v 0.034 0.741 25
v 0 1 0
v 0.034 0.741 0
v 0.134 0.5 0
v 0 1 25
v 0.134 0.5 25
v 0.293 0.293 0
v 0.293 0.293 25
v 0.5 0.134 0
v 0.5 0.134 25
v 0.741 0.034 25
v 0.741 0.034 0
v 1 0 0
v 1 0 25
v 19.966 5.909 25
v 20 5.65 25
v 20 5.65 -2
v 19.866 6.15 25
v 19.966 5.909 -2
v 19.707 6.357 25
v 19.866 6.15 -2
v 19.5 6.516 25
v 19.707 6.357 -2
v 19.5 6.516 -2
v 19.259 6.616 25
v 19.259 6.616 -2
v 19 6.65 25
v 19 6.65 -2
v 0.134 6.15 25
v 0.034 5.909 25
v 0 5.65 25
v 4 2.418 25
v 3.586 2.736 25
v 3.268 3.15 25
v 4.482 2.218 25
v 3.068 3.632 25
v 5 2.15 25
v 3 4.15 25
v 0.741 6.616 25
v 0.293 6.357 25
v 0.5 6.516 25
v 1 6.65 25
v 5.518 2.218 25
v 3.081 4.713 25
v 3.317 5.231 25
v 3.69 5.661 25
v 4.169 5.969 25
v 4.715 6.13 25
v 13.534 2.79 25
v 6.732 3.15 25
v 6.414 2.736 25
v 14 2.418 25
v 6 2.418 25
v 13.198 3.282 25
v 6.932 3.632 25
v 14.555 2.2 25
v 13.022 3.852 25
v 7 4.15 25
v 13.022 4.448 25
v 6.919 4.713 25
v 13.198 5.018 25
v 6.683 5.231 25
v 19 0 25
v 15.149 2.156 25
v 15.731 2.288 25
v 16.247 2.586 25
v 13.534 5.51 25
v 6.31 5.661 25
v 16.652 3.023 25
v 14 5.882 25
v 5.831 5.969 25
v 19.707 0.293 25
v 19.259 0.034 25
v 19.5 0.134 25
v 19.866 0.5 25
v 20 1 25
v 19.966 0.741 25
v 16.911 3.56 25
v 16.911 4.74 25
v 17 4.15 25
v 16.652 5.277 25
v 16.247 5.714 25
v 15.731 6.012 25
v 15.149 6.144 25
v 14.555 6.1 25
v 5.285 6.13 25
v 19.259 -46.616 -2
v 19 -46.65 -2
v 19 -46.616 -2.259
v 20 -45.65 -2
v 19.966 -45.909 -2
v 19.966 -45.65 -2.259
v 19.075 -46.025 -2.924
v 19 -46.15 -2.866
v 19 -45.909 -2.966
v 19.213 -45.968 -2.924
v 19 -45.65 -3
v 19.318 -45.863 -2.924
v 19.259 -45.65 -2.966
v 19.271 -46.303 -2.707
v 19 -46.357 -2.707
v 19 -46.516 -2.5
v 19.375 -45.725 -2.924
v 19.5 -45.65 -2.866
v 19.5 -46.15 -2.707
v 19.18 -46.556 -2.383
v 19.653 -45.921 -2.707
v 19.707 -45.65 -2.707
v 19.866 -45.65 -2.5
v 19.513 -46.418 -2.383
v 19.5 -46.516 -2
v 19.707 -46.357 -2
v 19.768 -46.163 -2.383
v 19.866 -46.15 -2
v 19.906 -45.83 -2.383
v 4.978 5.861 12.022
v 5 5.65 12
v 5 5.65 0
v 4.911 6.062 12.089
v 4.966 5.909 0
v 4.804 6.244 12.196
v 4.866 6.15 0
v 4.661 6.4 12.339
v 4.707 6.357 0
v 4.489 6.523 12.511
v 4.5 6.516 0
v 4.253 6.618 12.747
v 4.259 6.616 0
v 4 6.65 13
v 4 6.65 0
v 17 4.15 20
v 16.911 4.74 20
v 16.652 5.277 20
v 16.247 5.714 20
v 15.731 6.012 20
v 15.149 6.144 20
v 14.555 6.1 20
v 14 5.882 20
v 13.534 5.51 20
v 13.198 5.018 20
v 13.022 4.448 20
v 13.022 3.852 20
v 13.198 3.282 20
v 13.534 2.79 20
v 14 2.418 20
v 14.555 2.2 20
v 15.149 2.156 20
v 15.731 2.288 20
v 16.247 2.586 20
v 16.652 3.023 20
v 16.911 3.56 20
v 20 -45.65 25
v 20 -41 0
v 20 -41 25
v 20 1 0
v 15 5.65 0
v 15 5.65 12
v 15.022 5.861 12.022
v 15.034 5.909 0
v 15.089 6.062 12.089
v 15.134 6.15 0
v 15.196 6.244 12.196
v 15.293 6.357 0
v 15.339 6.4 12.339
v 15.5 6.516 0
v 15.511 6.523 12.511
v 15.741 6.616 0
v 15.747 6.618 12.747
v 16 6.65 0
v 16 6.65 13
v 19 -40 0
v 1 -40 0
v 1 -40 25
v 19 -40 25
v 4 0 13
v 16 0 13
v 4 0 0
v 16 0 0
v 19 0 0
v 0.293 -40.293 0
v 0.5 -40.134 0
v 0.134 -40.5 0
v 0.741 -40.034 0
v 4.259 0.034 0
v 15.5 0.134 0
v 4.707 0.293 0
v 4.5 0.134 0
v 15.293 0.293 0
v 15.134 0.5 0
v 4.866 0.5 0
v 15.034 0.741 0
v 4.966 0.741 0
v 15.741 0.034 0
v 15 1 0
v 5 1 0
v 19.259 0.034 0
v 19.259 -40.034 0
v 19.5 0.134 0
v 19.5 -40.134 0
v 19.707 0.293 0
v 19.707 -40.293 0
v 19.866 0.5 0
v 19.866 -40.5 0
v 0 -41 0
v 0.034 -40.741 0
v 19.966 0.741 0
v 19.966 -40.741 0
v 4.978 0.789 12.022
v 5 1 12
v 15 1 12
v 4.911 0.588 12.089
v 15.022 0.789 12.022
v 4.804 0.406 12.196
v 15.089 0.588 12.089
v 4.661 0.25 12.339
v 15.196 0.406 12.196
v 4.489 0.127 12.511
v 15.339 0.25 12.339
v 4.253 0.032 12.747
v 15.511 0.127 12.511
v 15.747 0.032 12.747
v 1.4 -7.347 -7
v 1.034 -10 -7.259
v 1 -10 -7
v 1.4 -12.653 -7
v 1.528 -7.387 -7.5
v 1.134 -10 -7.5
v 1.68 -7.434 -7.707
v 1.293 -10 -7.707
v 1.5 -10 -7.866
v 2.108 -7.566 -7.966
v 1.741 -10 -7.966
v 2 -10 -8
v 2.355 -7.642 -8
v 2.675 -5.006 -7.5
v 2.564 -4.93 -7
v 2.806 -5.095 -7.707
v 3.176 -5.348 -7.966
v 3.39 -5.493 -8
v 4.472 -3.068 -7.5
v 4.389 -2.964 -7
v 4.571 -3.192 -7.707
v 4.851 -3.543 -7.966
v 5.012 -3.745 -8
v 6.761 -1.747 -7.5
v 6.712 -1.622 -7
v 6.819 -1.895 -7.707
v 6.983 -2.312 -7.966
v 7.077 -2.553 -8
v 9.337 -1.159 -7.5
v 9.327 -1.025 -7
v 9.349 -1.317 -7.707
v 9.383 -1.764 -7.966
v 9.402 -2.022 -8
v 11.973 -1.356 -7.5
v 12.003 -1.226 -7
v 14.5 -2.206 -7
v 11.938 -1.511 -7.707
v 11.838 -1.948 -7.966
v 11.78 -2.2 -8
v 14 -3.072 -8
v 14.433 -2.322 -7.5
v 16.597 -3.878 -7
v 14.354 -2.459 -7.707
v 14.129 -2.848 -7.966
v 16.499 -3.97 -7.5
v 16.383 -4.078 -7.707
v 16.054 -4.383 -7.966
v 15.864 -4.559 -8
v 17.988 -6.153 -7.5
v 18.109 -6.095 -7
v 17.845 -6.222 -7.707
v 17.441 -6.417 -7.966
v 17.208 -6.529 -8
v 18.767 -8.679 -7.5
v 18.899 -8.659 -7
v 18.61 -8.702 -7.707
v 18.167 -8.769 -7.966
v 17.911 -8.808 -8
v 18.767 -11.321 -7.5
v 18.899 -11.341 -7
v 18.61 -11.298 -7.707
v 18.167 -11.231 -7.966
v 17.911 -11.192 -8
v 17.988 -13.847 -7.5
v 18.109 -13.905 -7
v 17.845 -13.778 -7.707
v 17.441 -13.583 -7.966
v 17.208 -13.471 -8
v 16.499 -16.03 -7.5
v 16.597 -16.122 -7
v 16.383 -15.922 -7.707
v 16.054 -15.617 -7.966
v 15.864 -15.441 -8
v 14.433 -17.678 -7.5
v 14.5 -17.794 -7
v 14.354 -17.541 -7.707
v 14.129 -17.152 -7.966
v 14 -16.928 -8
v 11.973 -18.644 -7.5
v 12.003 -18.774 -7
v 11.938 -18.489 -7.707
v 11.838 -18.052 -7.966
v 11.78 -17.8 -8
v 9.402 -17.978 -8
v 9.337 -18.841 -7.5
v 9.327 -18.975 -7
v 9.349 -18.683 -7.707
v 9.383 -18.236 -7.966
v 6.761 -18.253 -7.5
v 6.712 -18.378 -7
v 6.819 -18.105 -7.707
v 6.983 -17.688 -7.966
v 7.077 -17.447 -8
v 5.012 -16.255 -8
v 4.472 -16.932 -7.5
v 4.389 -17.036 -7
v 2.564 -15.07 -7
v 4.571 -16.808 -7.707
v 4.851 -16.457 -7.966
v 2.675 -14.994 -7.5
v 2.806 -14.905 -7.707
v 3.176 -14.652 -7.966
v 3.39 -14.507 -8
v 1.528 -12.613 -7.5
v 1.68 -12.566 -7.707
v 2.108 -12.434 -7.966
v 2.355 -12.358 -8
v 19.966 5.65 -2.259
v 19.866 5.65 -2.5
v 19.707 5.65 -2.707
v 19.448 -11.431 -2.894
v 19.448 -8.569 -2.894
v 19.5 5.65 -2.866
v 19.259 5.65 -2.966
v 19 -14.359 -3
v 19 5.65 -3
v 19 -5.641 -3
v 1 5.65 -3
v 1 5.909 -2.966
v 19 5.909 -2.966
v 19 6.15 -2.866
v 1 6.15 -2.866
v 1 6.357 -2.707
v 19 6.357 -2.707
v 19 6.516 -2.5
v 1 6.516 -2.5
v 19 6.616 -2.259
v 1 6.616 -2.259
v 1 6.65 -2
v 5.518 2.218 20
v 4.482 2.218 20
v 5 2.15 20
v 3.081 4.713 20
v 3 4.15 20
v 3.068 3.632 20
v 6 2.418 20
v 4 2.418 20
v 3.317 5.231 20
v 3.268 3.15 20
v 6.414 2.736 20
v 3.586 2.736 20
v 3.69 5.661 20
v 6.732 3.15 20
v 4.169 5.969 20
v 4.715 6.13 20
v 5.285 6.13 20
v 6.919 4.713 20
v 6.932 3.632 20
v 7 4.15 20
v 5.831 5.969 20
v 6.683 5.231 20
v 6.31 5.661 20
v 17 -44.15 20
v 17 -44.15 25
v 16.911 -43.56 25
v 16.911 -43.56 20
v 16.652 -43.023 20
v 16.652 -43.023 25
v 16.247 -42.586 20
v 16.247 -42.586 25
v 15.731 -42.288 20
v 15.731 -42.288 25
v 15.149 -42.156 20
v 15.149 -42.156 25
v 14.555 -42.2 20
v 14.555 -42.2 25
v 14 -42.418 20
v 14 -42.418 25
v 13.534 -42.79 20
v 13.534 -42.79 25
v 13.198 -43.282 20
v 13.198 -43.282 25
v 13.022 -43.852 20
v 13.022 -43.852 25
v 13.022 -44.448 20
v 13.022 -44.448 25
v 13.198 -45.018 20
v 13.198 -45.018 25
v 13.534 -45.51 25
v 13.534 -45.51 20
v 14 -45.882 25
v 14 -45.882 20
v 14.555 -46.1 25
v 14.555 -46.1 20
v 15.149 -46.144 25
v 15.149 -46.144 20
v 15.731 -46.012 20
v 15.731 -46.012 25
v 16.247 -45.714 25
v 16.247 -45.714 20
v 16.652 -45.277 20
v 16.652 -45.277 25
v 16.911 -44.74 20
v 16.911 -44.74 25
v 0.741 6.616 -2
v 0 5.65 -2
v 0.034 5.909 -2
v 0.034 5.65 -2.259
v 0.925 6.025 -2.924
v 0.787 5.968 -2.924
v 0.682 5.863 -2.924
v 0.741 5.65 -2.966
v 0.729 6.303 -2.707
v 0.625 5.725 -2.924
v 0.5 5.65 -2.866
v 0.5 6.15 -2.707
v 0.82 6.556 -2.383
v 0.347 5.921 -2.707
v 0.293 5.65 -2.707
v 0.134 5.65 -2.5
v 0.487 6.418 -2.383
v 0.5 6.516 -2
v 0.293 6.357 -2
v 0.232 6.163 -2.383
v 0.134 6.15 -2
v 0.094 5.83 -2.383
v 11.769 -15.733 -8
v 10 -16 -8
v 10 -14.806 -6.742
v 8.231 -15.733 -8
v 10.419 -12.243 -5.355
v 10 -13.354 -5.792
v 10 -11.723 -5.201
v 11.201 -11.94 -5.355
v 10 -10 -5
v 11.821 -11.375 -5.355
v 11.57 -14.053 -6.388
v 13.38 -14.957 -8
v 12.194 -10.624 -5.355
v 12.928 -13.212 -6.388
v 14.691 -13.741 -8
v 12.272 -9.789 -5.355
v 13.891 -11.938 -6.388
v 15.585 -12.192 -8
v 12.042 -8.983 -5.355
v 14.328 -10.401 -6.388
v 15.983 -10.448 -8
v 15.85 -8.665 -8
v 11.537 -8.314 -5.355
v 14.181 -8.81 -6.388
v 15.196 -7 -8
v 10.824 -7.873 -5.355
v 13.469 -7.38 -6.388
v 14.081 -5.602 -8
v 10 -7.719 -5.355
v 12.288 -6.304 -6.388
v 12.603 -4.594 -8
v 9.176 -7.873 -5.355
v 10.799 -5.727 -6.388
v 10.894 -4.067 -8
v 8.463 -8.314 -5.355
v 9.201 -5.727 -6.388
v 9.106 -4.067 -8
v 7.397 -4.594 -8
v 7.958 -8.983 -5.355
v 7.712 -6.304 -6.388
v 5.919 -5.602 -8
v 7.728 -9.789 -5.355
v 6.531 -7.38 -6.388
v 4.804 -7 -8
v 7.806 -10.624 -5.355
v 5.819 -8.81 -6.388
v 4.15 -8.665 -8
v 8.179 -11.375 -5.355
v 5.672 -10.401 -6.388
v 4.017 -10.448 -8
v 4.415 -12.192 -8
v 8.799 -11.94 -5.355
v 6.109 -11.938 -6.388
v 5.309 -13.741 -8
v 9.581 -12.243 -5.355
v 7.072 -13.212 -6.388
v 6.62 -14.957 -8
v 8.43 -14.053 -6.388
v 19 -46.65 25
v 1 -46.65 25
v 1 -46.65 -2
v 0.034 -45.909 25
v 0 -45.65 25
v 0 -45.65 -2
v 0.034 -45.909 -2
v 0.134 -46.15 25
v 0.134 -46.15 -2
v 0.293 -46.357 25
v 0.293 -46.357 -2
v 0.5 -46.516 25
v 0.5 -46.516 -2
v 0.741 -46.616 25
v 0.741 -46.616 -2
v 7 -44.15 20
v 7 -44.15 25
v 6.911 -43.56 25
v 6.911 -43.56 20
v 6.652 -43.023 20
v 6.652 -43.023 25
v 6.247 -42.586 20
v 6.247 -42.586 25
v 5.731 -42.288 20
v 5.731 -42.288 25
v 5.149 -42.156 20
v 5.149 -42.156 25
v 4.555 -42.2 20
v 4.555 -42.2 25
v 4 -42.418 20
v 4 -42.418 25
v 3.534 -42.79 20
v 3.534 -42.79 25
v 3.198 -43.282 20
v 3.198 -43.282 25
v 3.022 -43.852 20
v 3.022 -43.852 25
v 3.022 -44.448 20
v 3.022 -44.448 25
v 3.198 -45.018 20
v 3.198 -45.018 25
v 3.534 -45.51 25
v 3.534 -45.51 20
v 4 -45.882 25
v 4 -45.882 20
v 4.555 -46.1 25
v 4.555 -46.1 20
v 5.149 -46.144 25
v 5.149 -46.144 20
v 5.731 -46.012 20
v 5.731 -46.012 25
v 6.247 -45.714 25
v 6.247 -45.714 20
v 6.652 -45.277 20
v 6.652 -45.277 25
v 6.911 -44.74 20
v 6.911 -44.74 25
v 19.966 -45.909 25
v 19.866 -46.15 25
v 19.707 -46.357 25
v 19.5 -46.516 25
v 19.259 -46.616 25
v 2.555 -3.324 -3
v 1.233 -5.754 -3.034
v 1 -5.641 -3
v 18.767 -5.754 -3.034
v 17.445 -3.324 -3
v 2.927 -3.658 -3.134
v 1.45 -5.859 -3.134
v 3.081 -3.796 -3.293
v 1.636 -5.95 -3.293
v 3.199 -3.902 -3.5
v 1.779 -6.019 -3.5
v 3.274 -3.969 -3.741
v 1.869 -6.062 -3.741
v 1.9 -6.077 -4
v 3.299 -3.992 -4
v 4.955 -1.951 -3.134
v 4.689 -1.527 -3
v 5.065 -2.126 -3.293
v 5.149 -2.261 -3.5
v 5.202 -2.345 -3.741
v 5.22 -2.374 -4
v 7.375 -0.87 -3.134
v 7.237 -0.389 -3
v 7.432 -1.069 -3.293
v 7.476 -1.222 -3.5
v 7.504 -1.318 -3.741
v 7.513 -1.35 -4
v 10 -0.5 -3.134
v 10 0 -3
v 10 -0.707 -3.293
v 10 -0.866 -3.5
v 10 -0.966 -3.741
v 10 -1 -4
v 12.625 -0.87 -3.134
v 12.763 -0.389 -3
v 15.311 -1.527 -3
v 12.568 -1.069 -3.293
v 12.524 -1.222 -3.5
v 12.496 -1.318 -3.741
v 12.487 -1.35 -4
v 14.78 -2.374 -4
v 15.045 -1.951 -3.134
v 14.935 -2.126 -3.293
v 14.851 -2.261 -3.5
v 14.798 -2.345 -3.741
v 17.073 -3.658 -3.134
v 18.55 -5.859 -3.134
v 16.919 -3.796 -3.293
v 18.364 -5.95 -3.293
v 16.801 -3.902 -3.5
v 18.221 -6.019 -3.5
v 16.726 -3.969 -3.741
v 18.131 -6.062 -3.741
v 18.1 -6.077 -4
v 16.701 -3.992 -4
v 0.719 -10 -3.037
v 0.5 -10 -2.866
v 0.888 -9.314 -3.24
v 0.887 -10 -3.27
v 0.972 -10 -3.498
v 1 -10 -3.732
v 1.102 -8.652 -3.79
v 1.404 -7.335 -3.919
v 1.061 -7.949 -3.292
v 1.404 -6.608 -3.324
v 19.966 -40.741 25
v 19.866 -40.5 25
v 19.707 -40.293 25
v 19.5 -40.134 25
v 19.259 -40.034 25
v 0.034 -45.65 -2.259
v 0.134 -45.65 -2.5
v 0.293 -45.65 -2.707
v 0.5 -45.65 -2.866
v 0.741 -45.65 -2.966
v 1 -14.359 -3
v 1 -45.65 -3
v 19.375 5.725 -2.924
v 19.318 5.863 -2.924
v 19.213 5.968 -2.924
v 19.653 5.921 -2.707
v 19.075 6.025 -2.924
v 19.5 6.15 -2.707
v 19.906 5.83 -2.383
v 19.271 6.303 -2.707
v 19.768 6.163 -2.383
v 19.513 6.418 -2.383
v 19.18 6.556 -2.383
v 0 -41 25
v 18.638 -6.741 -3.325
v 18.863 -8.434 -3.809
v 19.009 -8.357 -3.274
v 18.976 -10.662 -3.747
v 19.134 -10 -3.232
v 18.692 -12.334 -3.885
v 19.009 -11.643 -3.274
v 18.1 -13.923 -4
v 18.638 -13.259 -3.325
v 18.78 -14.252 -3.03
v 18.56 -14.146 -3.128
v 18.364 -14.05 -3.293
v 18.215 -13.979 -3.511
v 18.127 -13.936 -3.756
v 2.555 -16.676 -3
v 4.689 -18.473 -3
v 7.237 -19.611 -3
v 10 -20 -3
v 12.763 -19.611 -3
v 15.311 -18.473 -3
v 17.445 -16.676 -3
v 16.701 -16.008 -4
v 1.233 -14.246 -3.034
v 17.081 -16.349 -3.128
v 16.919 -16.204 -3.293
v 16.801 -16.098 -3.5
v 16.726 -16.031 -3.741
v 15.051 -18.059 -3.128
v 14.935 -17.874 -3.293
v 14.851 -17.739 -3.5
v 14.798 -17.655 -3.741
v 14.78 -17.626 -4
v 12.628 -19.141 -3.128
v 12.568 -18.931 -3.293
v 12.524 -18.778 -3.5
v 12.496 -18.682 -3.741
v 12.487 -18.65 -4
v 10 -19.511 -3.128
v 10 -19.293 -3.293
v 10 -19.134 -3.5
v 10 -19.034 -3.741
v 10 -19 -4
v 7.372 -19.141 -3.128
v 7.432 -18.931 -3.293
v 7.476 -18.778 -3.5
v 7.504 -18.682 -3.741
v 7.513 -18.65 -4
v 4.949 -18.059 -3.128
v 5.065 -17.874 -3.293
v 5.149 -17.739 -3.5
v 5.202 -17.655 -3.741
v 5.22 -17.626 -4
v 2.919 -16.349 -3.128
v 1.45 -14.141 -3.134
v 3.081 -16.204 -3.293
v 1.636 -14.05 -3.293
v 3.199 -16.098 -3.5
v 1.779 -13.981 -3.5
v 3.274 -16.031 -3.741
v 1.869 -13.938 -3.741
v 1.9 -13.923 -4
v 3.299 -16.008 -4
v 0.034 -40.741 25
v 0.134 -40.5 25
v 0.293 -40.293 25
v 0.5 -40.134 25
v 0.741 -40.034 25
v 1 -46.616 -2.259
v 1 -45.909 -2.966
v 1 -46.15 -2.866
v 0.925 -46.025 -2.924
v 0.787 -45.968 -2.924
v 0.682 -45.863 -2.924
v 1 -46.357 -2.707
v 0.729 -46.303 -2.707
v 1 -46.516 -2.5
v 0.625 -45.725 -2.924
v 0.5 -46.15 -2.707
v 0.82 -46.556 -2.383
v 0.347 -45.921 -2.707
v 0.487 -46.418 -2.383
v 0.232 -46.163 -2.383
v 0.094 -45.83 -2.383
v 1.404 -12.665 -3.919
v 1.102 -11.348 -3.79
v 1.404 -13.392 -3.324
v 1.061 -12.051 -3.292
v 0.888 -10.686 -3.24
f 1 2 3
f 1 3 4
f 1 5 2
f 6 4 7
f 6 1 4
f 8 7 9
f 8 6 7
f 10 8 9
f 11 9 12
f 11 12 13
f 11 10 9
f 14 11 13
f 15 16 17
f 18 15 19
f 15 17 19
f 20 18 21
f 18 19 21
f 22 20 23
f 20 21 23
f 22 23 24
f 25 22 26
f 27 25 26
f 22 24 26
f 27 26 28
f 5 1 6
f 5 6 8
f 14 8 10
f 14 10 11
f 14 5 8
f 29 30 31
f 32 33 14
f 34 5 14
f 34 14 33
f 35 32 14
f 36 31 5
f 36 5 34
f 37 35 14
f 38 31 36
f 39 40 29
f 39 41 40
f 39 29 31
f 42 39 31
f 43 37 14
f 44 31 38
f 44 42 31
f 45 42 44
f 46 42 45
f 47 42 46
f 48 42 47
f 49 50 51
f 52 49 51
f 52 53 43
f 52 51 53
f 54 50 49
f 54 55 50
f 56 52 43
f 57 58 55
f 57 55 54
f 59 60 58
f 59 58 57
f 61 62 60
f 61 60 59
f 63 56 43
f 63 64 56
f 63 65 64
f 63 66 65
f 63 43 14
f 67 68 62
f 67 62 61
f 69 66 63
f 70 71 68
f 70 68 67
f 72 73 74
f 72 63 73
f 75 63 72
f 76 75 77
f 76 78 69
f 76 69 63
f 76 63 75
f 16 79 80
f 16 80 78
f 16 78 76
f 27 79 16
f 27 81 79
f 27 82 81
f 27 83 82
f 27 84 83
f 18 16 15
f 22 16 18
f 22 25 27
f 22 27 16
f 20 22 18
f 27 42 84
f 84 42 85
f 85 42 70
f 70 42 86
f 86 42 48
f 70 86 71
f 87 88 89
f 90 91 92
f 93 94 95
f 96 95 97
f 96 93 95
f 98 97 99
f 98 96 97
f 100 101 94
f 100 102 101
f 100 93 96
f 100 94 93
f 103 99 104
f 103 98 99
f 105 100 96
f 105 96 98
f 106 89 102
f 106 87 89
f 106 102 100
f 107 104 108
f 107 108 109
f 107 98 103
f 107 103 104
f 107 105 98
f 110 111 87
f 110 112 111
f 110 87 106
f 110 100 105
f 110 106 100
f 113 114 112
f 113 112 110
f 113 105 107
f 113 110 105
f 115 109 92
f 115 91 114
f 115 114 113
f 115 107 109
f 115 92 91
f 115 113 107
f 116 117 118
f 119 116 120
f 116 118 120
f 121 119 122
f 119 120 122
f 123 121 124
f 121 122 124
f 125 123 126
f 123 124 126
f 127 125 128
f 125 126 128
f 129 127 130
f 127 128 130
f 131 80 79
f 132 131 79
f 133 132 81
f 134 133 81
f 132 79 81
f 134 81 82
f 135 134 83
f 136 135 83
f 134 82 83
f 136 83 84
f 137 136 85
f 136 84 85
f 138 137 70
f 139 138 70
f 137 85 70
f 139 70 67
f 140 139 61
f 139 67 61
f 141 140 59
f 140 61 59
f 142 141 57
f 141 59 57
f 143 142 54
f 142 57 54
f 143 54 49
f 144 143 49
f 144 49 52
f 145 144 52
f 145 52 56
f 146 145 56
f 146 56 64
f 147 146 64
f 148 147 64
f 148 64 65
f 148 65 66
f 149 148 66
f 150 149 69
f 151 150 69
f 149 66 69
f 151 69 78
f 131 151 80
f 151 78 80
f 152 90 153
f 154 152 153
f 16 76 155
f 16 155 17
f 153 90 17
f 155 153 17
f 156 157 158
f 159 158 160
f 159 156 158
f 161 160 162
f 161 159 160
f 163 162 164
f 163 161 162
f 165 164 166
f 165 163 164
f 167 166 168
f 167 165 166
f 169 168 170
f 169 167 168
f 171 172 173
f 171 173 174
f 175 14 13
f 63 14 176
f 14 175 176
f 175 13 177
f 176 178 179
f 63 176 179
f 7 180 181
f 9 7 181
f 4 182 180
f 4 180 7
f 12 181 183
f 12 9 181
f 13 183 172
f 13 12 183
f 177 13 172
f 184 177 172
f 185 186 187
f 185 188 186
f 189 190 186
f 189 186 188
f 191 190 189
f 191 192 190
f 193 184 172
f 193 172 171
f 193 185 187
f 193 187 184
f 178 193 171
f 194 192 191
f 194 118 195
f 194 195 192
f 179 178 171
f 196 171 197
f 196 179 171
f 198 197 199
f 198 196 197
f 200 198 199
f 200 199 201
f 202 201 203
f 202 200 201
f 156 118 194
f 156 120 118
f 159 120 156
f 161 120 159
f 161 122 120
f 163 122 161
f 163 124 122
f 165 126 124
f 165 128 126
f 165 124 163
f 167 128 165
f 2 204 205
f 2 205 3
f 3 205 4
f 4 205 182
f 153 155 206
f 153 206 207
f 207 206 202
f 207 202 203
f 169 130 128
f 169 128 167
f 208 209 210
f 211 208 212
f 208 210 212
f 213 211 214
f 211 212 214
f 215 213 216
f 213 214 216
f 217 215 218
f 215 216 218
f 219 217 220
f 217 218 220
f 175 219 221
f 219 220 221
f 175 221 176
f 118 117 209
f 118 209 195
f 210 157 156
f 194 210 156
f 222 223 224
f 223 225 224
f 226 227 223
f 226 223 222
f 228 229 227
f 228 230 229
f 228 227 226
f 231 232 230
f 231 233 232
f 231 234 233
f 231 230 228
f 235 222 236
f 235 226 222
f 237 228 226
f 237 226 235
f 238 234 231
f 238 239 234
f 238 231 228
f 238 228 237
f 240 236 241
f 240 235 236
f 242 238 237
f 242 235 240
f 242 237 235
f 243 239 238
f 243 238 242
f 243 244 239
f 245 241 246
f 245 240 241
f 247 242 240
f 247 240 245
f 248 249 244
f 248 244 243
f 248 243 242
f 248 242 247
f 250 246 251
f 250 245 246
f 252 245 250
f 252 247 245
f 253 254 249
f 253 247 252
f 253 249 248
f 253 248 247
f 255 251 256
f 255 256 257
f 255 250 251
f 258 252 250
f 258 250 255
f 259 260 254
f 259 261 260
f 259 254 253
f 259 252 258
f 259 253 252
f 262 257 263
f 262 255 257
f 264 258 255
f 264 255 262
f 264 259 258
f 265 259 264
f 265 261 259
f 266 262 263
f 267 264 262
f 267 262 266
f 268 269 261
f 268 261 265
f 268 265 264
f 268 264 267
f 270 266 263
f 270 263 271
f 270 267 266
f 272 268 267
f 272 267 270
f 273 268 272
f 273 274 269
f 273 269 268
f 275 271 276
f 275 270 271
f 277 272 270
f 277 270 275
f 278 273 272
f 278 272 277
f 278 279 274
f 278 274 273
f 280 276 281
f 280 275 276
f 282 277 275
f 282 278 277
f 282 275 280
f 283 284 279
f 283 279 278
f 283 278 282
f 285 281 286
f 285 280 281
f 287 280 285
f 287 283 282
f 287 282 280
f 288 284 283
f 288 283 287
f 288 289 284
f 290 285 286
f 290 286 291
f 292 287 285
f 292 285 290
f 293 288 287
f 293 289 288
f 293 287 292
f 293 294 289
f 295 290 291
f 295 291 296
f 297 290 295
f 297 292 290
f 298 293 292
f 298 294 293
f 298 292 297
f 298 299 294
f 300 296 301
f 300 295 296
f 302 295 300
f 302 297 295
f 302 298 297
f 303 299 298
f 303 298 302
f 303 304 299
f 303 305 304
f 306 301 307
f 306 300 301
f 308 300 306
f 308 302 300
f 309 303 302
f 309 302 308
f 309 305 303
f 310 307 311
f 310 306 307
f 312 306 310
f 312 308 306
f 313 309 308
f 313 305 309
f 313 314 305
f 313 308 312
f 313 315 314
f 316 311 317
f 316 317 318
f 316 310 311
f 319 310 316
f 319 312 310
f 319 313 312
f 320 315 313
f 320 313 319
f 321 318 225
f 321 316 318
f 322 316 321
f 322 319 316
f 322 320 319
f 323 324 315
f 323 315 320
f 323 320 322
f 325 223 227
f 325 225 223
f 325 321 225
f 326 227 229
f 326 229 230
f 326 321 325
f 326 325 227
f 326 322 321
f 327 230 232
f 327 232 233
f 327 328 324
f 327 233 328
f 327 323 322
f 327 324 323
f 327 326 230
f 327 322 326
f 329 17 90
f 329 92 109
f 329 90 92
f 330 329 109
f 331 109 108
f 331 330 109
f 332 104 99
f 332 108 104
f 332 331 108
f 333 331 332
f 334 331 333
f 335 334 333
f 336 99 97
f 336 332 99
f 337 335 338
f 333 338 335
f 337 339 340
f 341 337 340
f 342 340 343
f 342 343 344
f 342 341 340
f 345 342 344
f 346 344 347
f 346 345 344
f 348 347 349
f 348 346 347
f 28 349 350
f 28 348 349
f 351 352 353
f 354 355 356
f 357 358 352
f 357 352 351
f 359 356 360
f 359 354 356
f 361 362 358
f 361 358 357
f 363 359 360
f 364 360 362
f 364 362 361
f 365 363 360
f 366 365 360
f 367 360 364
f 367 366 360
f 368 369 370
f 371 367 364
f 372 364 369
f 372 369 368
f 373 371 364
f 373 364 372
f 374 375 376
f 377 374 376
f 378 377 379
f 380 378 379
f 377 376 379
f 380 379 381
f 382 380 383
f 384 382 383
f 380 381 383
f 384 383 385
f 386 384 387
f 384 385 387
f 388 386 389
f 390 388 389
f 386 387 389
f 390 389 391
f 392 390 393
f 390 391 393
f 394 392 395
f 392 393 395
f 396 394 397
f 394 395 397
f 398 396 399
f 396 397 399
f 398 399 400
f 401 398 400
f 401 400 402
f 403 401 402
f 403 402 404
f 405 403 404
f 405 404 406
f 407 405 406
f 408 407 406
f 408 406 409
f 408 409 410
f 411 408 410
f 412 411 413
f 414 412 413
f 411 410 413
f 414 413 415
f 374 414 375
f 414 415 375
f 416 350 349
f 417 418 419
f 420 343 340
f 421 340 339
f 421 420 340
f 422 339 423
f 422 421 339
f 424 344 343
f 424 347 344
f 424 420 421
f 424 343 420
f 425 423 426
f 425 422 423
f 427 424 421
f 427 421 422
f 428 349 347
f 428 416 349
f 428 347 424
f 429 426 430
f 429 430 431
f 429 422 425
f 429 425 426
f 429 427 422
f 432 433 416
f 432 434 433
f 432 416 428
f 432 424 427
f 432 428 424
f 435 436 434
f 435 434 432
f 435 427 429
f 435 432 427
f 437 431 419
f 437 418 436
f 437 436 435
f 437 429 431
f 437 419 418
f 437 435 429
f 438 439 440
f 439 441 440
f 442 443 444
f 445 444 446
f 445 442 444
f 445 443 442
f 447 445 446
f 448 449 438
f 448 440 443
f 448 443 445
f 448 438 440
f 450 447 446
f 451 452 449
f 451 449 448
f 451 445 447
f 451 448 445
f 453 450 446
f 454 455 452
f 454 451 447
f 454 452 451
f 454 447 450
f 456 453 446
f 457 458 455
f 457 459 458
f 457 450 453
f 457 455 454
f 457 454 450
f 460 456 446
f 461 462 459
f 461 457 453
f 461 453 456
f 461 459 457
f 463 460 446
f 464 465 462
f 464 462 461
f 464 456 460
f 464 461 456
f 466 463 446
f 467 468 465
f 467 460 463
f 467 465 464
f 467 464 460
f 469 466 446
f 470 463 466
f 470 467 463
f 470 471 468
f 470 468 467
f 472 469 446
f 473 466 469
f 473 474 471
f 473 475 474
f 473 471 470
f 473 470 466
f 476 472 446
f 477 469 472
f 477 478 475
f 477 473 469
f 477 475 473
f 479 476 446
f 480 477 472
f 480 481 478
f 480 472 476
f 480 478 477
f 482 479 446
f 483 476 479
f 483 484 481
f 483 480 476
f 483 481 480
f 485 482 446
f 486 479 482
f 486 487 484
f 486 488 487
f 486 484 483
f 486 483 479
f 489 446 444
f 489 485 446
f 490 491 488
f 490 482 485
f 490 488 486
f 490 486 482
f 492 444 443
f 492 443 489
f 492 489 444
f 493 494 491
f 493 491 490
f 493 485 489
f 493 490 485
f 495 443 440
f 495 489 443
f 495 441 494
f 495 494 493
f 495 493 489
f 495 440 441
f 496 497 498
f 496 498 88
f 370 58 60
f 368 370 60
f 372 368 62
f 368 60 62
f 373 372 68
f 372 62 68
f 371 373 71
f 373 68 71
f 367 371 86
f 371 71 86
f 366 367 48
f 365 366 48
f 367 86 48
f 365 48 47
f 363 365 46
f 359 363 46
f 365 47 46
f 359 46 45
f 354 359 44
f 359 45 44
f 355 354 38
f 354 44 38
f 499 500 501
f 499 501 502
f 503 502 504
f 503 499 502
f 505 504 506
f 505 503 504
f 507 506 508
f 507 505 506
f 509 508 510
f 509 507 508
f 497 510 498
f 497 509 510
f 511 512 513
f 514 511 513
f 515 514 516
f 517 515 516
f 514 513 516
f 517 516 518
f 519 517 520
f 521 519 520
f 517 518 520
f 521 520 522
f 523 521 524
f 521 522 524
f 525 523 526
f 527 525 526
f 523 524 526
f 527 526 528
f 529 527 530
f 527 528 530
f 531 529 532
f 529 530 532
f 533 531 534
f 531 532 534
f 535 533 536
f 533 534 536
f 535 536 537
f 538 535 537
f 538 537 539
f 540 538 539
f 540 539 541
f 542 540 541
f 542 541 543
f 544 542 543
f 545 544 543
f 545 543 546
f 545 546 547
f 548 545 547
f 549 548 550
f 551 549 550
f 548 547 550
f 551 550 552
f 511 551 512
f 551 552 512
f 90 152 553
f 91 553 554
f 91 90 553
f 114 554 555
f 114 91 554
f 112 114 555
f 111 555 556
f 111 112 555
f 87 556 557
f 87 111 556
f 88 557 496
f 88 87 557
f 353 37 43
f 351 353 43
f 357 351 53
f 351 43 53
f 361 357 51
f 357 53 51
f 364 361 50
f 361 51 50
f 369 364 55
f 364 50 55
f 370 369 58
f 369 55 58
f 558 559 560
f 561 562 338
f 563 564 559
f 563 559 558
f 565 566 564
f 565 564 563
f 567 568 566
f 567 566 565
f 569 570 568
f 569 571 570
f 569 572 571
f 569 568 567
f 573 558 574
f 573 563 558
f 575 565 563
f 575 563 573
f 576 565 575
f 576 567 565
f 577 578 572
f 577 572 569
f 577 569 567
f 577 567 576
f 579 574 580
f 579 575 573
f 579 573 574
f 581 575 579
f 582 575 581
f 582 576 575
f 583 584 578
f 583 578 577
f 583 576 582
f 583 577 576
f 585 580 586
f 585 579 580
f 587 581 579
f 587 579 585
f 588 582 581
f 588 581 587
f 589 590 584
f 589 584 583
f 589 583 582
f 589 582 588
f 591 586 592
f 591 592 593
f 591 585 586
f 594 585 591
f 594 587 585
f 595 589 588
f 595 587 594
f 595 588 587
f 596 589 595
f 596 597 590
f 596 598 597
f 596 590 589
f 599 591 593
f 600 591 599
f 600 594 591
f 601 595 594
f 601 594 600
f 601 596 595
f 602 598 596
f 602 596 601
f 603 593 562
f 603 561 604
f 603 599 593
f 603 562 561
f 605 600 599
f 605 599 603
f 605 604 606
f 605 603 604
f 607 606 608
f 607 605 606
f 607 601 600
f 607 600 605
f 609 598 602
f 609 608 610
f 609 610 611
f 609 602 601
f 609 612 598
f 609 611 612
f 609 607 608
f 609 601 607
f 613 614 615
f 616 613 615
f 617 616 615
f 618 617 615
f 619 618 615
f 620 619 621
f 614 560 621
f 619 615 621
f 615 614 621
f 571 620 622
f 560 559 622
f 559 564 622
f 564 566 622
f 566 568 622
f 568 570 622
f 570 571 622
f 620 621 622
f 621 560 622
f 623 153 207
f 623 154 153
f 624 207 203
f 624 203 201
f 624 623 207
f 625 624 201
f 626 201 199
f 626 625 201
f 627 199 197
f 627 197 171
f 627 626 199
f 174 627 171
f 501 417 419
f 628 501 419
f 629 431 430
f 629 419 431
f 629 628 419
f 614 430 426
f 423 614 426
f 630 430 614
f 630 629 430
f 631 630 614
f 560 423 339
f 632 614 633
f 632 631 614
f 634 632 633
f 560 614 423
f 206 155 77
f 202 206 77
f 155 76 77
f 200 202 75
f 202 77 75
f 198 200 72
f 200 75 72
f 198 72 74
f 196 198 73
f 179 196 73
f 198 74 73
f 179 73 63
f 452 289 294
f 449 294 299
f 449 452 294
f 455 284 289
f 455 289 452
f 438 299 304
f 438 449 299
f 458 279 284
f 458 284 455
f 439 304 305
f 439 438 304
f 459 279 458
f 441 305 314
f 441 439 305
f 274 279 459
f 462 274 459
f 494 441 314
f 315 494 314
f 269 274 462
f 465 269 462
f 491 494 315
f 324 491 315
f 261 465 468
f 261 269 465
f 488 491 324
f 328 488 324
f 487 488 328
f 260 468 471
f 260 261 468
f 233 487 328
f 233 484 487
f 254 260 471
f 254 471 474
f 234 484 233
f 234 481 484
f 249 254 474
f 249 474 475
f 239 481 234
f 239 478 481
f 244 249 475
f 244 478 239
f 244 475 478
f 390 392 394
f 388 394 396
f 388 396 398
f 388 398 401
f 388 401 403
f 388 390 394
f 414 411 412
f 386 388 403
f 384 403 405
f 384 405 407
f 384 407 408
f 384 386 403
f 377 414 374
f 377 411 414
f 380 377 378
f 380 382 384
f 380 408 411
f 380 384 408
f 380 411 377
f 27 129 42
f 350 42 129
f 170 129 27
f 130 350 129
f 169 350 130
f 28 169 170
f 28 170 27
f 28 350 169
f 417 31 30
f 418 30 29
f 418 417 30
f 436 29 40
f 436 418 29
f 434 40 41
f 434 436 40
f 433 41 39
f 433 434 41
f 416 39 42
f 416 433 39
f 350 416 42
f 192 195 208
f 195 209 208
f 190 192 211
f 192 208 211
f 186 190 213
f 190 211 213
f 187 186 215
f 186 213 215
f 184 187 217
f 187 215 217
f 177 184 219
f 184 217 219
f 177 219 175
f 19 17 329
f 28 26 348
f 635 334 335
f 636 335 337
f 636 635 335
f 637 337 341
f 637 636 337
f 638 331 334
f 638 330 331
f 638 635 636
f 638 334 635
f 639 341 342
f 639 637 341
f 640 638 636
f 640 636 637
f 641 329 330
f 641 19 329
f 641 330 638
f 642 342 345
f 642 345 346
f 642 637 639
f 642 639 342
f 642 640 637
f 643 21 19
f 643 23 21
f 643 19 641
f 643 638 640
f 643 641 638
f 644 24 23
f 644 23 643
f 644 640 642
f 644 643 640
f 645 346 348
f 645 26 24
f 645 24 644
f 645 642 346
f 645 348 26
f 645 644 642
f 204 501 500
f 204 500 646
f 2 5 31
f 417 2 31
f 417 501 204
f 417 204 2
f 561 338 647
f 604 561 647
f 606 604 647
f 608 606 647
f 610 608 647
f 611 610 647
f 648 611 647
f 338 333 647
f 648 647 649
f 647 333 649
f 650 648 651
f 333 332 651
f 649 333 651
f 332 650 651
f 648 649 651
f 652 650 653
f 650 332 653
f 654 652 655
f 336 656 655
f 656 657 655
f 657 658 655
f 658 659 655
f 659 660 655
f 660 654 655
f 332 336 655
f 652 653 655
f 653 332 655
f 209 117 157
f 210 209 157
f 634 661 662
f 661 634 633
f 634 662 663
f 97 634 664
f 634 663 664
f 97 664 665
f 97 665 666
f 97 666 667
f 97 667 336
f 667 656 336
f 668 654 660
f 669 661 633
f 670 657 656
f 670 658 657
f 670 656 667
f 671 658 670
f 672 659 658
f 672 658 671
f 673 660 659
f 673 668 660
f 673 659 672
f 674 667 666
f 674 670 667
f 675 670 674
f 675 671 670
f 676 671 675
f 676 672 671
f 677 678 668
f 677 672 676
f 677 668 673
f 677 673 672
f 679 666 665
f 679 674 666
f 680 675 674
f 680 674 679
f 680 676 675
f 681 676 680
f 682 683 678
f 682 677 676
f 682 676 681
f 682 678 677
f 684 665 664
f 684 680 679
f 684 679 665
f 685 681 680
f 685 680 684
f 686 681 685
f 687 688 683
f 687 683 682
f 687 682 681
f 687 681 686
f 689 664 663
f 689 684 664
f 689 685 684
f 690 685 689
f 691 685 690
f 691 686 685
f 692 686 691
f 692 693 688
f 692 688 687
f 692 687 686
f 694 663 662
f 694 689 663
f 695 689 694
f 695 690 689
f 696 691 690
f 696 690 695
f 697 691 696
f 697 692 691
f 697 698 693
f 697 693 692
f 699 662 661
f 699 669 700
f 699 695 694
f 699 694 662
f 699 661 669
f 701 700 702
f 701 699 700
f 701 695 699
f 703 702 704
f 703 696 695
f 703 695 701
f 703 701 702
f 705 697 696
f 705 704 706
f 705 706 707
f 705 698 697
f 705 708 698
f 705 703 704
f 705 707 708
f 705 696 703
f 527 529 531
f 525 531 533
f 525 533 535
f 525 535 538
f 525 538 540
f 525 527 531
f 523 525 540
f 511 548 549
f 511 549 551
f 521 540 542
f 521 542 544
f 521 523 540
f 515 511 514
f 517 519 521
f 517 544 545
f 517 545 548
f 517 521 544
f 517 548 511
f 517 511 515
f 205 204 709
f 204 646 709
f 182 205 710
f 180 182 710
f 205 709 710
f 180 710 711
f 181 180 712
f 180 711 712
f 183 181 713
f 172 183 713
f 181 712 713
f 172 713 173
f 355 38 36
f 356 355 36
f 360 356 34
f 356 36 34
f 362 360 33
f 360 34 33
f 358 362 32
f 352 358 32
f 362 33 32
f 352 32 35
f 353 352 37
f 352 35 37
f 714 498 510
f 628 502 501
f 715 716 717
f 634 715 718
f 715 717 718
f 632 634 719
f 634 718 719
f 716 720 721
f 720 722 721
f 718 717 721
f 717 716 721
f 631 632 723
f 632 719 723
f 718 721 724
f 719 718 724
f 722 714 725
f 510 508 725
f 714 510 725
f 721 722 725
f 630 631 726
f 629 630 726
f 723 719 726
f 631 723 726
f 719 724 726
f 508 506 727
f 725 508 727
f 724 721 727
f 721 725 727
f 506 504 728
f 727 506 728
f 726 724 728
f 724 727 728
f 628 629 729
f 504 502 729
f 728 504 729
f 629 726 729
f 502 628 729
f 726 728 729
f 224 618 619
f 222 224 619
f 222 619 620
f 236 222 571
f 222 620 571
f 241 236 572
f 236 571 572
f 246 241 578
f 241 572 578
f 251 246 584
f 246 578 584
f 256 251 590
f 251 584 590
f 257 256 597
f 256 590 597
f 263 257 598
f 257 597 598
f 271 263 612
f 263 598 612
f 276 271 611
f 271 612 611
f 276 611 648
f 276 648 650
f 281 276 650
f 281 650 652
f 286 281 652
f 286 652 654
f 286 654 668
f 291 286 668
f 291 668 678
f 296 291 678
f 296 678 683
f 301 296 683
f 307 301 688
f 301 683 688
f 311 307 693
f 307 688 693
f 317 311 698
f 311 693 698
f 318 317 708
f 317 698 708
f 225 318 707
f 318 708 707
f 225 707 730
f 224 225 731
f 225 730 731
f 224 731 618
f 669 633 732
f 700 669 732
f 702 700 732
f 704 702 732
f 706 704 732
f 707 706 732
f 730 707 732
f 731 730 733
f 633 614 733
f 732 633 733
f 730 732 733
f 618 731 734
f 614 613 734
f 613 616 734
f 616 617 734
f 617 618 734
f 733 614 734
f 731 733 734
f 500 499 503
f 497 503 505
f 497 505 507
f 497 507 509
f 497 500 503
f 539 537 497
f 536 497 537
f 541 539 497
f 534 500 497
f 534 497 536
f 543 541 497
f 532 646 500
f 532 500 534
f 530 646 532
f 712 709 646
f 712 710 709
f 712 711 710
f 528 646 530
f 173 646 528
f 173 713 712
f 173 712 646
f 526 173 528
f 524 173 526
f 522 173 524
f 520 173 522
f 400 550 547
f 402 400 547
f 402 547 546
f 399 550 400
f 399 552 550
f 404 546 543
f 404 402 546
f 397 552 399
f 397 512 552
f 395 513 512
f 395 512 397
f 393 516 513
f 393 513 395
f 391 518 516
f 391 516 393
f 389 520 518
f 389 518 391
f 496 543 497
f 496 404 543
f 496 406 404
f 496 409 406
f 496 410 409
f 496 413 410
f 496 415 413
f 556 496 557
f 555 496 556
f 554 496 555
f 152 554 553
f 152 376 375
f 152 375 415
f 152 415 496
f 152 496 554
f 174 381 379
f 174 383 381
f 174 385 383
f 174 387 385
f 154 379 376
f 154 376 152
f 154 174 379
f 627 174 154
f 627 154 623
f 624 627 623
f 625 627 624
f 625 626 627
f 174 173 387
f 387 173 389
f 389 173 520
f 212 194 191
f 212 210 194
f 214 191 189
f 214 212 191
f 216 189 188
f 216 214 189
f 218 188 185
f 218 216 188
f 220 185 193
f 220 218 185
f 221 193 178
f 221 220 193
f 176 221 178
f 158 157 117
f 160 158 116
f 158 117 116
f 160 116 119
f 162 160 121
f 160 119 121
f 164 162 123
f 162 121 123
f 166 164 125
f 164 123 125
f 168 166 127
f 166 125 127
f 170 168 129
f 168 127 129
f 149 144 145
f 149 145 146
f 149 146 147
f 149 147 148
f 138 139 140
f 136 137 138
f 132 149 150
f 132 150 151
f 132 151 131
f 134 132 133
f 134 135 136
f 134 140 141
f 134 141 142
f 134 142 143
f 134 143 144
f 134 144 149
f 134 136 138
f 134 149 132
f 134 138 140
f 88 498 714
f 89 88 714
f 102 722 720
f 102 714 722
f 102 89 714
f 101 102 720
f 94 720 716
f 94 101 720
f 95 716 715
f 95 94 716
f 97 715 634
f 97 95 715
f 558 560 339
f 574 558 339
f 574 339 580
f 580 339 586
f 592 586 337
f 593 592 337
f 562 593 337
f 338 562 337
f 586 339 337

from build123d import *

# Parameters (mm, degrees)
SKETCH1_W           = 20
SKETCH1_H           = 6.65
SKETCH1_H_2         = 20
BOSS_EXTRUDE1_DEPTH = 3
SKETCH1_3_W         = 20
SKETCH1_3_H         = 6.65
BOSS_EXTRUDE2_DEPTH = 25
SKETCH3_R           = 2
CUT_EXTRUDE1_DEPTH  = 5
SKETCH4_R           = 9
BOSS_EXTRUDE3_DEPTH = 5
CUT_EXTRUDE2_REACH  = 64.176
SKETCH6_W           = 5
SKETCH6_H           = 12
FILLET2_R           = 1
FILLET3_R           = 1


with BuildPart() as part:
    # Sketch1 → Boss-Extrude1 (new body)
    with BuildSketch(Plane.XY):
        with Locations((10, 3.325)):
            Rectangle(SKETCH1_W, SKETCH1_H)
        with Locations((10, -10)):
            Rectangle(SKETCH1_W, SKETCH1_H_2)
        with Locations((10, -30)):
            Rectangle(SKETCH1_W, SKETCH1_H_2)
        with Locations((10, -43.325)):
            Rectangle(SKETCH1_W, SKETCH1_H)
    extrude(amount=-BOSS_EXTRUDE1_DEPTH)

    # Sketch1_3 → Boss-Extrude2 (add)
    with BuildSketch(Plane.XY):
        with Locations((10, 3.325)):
            Rectangle(SKETCH1_3_W, SKETCH1_3_H)
        with Locations((10, -43.325)):
            Rectangle(SKETCH1_3_W, SKETCH1_3_H)
    extrude(amount=BOSS_EXTRUDE2_DEPTH)

    # Sketch3 → Cut-Extrude1 (cut)
    with BuildSketch(Plane.XY.offset(25)):
        with BuildLine():
            ThreePointArc((3, 4.15), (3.585786438, 2.735786438), (5, 2.15))
            Line((5, 2.15), (5, 4.15))
            Line((5, 4.15), (3, 4.15))
        make_face()
        with BuildLine():
            Line((5, 4.15), (5, 2.15))
            ThreePointArc((5, 2.15), (6.414213562, 2.735786438), (7, 4.15))
            ThreePointArc((7, 4.15), (5, 6.15), (3, 4.15))
            Line((3, 4.15), (5, 4.15))
        make_face()
        with Locations((15, 4.15)):
            Circle(SKETCH3_R)
        with Locations((5, -44.15)):
            Circle(SKETCH3_R)
        with Locations((15, -44.15)):
            Circle(SKETCH3_R)
    extrude(amount=-CUT_EXTRUDE1_DEPTH, mode=Mode.SUBTRACT)

    # Sketch4 → Boss-Extrude3 (add)
    with BuildSketch(Plane(origin=(0, 0, -3), x_dir=(-1, 0, 0), z_dir=(0, 0, -1))):
        with Locations((-10, -10)):
            Circle(SKETCH4_R)
    extrude(amount=BOSS_EXTRUDE3_DEPTH)

    # Sketch5 → Cut-Revolve1 (revolve, cut)
    with BuildSketch(Plane(origin=(10, 0, 0), x_dir=(0, 0, -1), z_dir=(1, 0, 0)), mode=Mode.PRIVATE) as cut_revolve1_sk:
        with BuildLine():
            ThreePointArc((5, -10), (5.791796068, -6.645898034), (8, -4))
            Line((8, -4), (8, -10))
            Line((8, -10), (5, -10))
        make_face()
    revolve(cut_revolve1_sk.sketch.rotate(Axis((10, -10, -8), (0, 0, 1)), 180), axis=Axis((10, -10, -8), (0, 0, 1)), mode=Mode.SUBTRACT)

    # Sketch6 → Cut-Extrude2 (cut, up to next)
    with BuildSketch(Plane(origin=(0, 6.65, 0), x_dir=(1, 0, 0), z_dir=(0, 1, 0)), mode=Mode.PRIVATE) as cut_extrude2_sk1:
        with Locations((7.5, -6)):
            Rectangle(SKETCH6_W, SKETCH6_H)
    cut_extrude2_tool1 = extrude(cut_extrude2_sk1.sketch, amount=-CUT_EXTRUDE2_REACH, mode=Mode.PRIVATE) & part.part
    # Sketch6 → Cut-Extrude2 (cut, up to next)
    with BuildSketch(Plane(origin=(0, 6.65, 0), x_dir=(1, 0, 0), z_dir=(0, 1, 0)), mode=Mode.PRIVATE) as cut_extrude2_sk2:
        with Locations((12.5, -6)):
            Rectangle(SKETCH6_W, SKETCH6_H)
    cut_extrude2_tool2 = extrude(cut_extrude2_sk2.sketch, amount=-CUT_EXTRUDE2_REACH, mode=Mode.PRIVATE) & part.part
    add(cut_extrude2_tool1.solids().sort_by_distance((7.5, 6.65, 6))[0], mode=Mode.SUBTRACT)
    add(cut_extrude2_tool2.solids().sort_by_distance((12.5, 6.65, 6))[0], mode=Mode.SUBTRACT)

    # Fillet2
    fillet2_edges = [part.edges().sort_by_distance(p)[0] for p in [
        (0, 6.65, 11),
        (20, 6.65, 11),
        (20, -46.65, 11),
        (0, -46.65, 11),
        (10, -46.65, -3),
        (20, -20, -3),
        (0, 0, 12.5),
        (20, 0, 12.5),
        (20, -40, 12.5),
        (0, -40, 12.5),
        (10, 6.65, -3),
        (0, -20, -3),
        (19, -10, -8),
        (10, 6.65, 12),
        (15, 6.65, 6),
        (5, 0, 6),
        (5, 6.65, 6),
        (15, 0, 6),
        (10, 0, 12),
    ]]
    fillet(fillet2_edges, radius=FILLET2_R - 0.0001)  # a hair under: the kernel refuses the full size

    # Fillet3
    fillet3_edges = [part.edges().sort_by_distance(p)[0] for p in [
        (19, -10, -3),
        (19, -10, -3),
    ]]
    fillet(fillet3_edges, radius=FILLET3_R)


solid = part.part
